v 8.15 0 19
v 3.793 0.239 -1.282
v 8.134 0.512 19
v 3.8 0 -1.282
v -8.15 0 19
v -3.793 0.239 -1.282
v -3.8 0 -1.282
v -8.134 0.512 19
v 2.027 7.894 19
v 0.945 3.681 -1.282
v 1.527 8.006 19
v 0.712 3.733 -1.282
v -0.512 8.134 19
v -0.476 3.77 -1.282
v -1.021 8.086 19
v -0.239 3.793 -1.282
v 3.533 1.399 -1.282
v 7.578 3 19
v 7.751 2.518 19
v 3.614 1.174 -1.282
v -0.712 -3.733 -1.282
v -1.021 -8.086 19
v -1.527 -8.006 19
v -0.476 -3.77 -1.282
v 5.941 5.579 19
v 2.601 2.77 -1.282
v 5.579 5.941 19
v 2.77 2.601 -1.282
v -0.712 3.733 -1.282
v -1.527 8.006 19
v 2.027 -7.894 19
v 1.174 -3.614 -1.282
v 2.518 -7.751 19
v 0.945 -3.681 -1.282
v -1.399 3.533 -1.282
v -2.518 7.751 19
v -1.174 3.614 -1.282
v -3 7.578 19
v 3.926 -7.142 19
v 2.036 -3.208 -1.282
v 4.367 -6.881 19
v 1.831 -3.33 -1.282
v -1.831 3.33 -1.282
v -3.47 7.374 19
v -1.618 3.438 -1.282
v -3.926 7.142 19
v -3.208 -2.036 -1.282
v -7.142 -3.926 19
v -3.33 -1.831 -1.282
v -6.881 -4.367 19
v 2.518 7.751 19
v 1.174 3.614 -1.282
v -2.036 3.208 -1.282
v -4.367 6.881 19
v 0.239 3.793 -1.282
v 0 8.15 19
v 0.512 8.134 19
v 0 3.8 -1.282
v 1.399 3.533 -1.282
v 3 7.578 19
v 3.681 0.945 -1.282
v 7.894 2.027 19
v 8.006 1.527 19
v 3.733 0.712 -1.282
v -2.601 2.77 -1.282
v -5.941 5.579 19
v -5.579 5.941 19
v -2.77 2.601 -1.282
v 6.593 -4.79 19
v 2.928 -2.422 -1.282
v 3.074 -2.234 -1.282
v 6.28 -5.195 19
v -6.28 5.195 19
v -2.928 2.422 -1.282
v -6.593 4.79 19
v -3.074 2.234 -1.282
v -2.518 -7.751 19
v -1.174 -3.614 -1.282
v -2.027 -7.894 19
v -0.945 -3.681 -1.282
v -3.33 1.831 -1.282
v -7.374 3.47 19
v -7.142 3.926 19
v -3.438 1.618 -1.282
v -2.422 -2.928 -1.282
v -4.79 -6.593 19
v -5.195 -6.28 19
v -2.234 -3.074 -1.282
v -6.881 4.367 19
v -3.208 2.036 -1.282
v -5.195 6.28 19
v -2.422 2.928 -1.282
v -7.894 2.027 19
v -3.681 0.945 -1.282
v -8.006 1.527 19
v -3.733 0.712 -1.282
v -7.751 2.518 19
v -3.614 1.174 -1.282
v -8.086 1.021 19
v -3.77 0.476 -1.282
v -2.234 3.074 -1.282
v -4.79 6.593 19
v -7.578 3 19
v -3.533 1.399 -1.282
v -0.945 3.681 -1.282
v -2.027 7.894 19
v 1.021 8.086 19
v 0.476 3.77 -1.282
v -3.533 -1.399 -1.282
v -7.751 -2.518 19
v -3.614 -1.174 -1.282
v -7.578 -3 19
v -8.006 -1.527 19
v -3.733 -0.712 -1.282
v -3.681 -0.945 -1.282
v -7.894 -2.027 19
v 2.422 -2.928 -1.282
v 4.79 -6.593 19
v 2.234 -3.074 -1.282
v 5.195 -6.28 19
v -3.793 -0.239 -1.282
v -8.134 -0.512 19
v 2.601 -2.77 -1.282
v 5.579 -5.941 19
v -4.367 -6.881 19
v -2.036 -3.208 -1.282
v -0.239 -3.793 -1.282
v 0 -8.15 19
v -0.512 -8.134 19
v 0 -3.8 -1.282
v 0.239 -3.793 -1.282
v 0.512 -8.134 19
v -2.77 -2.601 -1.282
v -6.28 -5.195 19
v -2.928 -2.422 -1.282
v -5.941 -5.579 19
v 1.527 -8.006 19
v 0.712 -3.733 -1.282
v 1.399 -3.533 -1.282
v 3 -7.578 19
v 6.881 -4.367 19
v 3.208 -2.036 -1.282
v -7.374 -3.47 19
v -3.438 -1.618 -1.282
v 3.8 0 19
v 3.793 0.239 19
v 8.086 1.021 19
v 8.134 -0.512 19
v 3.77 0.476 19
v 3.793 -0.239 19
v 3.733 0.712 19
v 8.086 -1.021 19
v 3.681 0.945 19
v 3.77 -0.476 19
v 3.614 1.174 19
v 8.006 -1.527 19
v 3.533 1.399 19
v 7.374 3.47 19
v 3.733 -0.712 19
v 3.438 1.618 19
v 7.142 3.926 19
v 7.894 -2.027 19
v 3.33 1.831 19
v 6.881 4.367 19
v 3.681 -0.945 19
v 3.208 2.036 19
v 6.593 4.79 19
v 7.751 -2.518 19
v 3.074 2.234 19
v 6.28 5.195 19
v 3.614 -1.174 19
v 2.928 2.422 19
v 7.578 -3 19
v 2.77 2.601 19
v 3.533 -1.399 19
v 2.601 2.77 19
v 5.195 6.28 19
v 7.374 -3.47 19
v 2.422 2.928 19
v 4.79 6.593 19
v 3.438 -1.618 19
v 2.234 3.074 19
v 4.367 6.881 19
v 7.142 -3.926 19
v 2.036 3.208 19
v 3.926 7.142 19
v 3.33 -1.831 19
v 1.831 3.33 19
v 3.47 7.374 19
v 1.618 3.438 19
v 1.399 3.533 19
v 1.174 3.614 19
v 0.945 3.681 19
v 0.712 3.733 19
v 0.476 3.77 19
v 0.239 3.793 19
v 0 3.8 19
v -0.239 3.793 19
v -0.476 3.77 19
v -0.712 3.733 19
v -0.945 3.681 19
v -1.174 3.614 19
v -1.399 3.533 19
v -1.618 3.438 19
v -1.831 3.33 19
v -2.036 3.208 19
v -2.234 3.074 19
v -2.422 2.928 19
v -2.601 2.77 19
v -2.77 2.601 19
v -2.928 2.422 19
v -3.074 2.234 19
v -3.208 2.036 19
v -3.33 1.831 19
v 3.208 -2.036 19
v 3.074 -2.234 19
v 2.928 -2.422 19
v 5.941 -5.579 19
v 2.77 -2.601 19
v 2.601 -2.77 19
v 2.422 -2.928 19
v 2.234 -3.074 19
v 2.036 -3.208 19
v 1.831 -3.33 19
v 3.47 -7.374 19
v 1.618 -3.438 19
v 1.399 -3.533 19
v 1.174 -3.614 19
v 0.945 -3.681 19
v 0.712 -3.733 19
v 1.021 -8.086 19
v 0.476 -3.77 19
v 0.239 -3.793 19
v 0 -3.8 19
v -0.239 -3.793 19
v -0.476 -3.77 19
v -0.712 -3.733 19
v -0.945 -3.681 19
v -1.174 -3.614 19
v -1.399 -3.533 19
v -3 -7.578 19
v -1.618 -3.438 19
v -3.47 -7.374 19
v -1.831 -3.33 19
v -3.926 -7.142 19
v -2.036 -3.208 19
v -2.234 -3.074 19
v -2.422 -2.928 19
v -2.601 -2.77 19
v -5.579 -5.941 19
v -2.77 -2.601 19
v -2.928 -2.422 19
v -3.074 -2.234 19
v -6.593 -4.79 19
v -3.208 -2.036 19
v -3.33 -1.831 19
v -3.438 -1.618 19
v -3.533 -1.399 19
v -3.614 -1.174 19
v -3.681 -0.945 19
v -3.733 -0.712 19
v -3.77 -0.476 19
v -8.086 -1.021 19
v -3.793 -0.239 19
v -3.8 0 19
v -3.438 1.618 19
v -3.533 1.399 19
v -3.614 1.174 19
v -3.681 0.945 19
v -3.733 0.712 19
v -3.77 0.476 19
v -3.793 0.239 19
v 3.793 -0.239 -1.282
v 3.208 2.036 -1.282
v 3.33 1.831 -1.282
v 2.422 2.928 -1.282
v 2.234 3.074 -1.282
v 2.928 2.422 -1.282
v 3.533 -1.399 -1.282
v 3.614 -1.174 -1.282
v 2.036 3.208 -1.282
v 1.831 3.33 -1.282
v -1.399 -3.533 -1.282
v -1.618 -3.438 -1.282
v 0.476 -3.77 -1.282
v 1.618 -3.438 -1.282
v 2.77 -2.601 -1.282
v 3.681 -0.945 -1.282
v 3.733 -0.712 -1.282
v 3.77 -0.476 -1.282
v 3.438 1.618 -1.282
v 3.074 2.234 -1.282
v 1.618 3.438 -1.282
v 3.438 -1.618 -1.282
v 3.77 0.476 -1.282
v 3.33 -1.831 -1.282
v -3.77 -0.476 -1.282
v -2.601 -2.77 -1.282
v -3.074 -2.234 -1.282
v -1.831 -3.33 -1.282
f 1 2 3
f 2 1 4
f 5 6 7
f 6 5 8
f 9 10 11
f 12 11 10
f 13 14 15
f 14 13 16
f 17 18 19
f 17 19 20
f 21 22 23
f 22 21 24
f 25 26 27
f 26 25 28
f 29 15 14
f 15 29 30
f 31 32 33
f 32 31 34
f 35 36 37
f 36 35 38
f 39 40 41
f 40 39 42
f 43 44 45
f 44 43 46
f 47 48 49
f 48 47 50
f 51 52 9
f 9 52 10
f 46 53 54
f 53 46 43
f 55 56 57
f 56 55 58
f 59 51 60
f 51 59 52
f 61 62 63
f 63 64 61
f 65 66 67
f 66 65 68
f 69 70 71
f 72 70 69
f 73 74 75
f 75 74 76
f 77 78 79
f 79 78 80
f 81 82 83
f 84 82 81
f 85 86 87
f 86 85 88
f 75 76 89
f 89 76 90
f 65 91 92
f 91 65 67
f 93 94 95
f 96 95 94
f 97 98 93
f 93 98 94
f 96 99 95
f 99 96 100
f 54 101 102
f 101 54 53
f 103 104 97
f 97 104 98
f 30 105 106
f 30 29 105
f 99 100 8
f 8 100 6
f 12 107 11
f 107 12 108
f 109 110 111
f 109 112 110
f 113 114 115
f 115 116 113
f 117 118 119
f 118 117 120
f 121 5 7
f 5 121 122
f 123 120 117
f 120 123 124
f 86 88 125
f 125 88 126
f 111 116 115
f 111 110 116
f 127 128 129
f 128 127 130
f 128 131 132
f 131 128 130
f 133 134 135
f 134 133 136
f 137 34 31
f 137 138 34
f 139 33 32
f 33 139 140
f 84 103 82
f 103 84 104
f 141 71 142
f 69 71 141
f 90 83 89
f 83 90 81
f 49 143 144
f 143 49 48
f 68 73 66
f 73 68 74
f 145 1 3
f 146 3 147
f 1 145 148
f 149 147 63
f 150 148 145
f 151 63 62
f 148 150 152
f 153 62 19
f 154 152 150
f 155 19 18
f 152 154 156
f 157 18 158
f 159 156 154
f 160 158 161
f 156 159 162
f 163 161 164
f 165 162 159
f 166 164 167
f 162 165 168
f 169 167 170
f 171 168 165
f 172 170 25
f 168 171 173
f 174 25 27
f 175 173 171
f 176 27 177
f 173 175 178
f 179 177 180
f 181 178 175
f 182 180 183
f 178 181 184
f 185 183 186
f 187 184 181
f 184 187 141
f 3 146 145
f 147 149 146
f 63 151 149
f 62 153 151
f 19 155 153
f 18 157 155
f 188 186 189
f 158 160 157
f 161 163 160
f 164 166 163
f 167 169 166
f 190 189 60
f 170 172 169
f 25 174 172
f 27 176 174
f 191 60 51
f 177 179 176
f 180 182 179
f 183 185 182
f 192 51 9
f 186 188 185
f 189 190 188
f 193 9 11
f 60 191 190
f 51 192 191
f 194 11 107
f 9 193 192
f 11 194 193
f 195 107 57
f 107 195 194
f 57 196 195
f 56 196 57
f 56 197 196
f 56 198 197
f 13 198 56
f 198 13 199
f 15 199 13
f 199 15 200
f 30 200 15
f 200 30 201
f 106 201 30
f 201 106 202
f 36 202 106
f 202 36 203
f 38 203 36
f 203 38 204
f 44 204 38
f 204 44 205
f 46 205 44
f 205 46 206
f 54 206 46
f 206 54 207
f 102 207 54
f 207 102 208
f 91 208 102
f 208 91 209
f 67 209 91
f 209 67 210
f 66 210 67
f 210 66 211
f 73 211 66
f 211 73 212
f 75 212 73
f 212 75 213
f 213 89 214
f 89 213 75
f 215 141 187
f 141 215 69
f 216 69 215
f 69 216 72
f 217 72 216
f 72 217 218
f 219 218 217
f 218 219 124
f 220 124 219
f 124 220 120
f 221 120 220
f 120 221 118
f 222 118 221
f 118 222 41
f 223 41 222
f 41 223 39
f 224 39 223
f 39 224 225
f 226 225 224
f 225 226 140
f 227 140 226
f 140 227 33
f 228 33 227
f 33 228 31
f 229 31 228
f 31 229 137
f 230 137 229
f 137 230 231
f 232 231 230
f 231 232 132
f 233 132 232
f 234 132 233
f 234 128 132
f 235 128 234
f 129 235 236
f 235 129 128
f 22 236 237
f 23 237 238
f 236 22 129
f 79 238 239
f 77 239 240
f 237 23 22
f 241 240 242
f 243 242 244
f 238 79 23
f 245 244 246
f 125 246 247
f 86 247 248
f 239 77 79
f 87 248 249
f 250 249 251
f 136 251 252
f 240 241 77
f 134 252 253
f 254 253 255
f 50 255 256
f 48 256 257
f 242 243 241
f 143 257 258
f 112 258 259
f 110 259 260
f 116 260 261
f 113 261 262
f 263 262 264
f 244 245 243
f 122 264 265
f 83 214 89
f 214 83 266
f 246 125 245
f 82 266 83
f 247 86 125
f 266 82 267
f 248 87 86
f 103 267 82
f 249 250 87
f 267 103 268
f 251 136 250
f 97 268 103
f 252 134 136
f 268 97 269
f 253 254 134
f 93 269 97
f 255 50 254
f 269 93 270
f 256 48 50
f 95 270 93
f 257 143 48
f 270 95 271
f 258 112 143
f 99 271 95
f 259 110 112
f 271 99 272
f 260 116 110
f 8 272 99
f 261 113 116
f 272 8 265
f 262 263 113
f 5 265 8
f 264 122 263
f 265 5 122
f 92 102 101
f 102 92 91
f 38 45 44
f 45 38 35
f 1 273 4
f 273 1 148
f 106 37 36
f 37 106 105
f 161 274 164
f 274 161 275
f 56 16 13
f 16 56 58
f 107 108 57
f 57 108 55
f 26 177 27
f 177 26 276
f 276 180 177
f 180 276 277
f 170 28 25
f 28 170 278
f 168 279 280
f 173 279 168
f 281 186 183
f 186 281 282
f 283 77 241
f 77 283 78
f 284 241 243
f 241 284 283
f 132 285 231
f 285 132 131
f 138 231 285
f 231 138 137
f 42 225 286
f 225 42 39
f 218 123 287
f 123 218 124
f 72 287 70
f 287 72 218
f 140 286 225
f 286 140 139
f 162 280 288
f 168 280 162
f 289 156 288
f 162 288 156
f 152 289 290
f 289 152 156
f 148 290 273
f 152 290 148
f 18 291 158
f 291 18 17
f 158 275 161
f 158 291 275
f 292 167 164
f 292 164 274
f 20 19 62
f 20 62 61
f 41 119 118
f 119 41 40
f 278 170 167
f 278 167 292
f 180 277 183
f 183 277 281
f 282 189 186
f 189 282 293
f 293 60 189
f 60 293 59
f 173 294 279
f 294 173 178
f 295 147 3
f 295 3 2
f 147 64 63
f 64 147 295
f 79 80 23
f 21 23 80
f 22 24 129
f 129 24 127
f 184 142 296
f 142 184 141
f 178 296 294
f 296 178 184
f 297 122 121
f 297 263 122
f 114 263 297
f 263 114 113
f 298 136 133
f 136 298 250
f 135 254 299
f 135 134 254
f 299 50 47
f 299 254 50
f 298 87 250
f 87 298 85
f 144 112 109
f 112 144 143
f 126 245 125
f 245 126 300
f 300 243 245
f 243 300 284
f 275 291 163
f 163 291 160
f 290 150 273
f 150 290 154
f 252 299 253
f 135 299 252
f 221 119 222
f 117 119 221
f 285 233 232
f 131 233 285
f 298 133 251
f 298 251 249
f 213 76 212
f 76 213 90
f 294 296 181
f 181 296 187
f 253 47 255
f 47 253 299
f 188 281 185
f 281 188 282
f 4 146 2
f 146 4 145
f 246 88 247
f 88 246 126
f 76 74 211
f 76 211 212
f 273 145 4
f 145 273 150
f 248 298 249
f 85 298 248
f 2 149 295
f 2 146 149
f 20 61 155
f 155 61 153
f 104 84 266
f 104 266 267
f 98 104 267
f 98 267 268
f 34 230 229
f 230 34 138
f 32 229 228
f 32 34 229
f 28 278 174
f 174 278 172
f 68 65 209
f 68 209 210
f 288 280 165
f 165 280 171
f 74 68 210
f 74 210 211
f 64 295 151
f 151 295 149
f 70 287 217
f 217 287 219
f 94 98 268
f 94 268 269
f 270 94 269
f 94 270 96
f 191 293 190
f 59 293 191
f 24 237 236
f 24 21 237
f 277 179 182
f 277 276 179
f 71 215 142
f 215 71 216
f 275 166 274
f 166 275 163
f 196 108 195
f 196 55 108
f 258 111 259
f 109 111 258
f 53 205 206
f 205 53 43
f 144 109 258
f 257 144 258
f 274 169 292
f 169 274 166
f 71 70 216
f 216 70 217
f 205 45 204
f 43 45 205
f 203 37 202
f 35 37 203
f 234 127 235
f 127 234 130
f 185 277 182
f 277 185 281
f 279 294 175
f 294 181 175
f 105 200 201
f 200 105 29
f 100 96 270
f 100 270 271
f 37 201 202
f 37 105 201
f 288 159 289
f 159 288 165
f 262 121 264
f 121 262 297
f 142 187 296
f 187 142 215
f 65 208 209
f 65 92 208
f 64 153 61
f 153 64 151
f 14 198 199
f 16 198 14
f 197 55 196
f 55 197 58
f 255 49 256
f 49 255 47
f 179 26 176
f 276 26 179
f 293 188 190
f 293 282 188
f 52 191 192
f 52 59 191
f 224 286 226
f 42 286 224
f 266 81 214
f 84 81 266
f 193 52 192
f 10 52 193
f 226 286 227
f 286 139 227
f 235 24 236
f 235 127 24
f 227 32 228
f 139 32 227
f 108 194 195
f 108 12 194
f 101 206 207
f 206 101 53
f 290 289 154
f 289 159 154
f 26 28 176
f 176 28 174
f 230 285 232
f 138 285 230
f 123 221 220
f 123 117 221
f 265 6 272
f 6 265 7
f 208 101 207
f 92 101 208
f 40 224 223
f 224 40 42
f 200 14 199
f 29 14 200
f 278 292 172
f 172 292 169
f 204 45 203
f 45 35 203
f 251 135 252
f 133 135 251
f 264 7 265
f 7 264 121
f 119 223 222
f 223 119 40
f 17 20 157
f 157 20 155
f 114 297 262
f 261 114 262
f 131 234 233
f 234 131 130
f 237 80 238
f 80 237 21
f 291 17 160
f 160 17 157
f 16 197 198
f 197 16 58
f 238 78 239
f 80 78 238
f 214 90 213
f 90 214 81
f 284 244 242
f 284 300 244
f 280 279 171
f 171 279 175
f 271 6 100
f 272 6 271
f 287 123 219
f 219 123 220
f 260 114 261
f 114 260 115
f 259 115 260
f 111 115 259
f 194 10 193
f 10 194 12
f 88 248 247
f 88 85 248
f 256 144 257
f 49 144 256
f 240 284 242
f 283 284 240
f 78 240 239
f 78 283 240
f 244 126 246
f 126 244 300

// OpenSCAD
diam_foro_estr=7.6;
difference(){
cylinder(r1=0,r2=16.3/2,h=38,$fn=100,center=true);
cylinder(r=diam_foro_estr/2,h=50,$fn=100,center=true);    
}
